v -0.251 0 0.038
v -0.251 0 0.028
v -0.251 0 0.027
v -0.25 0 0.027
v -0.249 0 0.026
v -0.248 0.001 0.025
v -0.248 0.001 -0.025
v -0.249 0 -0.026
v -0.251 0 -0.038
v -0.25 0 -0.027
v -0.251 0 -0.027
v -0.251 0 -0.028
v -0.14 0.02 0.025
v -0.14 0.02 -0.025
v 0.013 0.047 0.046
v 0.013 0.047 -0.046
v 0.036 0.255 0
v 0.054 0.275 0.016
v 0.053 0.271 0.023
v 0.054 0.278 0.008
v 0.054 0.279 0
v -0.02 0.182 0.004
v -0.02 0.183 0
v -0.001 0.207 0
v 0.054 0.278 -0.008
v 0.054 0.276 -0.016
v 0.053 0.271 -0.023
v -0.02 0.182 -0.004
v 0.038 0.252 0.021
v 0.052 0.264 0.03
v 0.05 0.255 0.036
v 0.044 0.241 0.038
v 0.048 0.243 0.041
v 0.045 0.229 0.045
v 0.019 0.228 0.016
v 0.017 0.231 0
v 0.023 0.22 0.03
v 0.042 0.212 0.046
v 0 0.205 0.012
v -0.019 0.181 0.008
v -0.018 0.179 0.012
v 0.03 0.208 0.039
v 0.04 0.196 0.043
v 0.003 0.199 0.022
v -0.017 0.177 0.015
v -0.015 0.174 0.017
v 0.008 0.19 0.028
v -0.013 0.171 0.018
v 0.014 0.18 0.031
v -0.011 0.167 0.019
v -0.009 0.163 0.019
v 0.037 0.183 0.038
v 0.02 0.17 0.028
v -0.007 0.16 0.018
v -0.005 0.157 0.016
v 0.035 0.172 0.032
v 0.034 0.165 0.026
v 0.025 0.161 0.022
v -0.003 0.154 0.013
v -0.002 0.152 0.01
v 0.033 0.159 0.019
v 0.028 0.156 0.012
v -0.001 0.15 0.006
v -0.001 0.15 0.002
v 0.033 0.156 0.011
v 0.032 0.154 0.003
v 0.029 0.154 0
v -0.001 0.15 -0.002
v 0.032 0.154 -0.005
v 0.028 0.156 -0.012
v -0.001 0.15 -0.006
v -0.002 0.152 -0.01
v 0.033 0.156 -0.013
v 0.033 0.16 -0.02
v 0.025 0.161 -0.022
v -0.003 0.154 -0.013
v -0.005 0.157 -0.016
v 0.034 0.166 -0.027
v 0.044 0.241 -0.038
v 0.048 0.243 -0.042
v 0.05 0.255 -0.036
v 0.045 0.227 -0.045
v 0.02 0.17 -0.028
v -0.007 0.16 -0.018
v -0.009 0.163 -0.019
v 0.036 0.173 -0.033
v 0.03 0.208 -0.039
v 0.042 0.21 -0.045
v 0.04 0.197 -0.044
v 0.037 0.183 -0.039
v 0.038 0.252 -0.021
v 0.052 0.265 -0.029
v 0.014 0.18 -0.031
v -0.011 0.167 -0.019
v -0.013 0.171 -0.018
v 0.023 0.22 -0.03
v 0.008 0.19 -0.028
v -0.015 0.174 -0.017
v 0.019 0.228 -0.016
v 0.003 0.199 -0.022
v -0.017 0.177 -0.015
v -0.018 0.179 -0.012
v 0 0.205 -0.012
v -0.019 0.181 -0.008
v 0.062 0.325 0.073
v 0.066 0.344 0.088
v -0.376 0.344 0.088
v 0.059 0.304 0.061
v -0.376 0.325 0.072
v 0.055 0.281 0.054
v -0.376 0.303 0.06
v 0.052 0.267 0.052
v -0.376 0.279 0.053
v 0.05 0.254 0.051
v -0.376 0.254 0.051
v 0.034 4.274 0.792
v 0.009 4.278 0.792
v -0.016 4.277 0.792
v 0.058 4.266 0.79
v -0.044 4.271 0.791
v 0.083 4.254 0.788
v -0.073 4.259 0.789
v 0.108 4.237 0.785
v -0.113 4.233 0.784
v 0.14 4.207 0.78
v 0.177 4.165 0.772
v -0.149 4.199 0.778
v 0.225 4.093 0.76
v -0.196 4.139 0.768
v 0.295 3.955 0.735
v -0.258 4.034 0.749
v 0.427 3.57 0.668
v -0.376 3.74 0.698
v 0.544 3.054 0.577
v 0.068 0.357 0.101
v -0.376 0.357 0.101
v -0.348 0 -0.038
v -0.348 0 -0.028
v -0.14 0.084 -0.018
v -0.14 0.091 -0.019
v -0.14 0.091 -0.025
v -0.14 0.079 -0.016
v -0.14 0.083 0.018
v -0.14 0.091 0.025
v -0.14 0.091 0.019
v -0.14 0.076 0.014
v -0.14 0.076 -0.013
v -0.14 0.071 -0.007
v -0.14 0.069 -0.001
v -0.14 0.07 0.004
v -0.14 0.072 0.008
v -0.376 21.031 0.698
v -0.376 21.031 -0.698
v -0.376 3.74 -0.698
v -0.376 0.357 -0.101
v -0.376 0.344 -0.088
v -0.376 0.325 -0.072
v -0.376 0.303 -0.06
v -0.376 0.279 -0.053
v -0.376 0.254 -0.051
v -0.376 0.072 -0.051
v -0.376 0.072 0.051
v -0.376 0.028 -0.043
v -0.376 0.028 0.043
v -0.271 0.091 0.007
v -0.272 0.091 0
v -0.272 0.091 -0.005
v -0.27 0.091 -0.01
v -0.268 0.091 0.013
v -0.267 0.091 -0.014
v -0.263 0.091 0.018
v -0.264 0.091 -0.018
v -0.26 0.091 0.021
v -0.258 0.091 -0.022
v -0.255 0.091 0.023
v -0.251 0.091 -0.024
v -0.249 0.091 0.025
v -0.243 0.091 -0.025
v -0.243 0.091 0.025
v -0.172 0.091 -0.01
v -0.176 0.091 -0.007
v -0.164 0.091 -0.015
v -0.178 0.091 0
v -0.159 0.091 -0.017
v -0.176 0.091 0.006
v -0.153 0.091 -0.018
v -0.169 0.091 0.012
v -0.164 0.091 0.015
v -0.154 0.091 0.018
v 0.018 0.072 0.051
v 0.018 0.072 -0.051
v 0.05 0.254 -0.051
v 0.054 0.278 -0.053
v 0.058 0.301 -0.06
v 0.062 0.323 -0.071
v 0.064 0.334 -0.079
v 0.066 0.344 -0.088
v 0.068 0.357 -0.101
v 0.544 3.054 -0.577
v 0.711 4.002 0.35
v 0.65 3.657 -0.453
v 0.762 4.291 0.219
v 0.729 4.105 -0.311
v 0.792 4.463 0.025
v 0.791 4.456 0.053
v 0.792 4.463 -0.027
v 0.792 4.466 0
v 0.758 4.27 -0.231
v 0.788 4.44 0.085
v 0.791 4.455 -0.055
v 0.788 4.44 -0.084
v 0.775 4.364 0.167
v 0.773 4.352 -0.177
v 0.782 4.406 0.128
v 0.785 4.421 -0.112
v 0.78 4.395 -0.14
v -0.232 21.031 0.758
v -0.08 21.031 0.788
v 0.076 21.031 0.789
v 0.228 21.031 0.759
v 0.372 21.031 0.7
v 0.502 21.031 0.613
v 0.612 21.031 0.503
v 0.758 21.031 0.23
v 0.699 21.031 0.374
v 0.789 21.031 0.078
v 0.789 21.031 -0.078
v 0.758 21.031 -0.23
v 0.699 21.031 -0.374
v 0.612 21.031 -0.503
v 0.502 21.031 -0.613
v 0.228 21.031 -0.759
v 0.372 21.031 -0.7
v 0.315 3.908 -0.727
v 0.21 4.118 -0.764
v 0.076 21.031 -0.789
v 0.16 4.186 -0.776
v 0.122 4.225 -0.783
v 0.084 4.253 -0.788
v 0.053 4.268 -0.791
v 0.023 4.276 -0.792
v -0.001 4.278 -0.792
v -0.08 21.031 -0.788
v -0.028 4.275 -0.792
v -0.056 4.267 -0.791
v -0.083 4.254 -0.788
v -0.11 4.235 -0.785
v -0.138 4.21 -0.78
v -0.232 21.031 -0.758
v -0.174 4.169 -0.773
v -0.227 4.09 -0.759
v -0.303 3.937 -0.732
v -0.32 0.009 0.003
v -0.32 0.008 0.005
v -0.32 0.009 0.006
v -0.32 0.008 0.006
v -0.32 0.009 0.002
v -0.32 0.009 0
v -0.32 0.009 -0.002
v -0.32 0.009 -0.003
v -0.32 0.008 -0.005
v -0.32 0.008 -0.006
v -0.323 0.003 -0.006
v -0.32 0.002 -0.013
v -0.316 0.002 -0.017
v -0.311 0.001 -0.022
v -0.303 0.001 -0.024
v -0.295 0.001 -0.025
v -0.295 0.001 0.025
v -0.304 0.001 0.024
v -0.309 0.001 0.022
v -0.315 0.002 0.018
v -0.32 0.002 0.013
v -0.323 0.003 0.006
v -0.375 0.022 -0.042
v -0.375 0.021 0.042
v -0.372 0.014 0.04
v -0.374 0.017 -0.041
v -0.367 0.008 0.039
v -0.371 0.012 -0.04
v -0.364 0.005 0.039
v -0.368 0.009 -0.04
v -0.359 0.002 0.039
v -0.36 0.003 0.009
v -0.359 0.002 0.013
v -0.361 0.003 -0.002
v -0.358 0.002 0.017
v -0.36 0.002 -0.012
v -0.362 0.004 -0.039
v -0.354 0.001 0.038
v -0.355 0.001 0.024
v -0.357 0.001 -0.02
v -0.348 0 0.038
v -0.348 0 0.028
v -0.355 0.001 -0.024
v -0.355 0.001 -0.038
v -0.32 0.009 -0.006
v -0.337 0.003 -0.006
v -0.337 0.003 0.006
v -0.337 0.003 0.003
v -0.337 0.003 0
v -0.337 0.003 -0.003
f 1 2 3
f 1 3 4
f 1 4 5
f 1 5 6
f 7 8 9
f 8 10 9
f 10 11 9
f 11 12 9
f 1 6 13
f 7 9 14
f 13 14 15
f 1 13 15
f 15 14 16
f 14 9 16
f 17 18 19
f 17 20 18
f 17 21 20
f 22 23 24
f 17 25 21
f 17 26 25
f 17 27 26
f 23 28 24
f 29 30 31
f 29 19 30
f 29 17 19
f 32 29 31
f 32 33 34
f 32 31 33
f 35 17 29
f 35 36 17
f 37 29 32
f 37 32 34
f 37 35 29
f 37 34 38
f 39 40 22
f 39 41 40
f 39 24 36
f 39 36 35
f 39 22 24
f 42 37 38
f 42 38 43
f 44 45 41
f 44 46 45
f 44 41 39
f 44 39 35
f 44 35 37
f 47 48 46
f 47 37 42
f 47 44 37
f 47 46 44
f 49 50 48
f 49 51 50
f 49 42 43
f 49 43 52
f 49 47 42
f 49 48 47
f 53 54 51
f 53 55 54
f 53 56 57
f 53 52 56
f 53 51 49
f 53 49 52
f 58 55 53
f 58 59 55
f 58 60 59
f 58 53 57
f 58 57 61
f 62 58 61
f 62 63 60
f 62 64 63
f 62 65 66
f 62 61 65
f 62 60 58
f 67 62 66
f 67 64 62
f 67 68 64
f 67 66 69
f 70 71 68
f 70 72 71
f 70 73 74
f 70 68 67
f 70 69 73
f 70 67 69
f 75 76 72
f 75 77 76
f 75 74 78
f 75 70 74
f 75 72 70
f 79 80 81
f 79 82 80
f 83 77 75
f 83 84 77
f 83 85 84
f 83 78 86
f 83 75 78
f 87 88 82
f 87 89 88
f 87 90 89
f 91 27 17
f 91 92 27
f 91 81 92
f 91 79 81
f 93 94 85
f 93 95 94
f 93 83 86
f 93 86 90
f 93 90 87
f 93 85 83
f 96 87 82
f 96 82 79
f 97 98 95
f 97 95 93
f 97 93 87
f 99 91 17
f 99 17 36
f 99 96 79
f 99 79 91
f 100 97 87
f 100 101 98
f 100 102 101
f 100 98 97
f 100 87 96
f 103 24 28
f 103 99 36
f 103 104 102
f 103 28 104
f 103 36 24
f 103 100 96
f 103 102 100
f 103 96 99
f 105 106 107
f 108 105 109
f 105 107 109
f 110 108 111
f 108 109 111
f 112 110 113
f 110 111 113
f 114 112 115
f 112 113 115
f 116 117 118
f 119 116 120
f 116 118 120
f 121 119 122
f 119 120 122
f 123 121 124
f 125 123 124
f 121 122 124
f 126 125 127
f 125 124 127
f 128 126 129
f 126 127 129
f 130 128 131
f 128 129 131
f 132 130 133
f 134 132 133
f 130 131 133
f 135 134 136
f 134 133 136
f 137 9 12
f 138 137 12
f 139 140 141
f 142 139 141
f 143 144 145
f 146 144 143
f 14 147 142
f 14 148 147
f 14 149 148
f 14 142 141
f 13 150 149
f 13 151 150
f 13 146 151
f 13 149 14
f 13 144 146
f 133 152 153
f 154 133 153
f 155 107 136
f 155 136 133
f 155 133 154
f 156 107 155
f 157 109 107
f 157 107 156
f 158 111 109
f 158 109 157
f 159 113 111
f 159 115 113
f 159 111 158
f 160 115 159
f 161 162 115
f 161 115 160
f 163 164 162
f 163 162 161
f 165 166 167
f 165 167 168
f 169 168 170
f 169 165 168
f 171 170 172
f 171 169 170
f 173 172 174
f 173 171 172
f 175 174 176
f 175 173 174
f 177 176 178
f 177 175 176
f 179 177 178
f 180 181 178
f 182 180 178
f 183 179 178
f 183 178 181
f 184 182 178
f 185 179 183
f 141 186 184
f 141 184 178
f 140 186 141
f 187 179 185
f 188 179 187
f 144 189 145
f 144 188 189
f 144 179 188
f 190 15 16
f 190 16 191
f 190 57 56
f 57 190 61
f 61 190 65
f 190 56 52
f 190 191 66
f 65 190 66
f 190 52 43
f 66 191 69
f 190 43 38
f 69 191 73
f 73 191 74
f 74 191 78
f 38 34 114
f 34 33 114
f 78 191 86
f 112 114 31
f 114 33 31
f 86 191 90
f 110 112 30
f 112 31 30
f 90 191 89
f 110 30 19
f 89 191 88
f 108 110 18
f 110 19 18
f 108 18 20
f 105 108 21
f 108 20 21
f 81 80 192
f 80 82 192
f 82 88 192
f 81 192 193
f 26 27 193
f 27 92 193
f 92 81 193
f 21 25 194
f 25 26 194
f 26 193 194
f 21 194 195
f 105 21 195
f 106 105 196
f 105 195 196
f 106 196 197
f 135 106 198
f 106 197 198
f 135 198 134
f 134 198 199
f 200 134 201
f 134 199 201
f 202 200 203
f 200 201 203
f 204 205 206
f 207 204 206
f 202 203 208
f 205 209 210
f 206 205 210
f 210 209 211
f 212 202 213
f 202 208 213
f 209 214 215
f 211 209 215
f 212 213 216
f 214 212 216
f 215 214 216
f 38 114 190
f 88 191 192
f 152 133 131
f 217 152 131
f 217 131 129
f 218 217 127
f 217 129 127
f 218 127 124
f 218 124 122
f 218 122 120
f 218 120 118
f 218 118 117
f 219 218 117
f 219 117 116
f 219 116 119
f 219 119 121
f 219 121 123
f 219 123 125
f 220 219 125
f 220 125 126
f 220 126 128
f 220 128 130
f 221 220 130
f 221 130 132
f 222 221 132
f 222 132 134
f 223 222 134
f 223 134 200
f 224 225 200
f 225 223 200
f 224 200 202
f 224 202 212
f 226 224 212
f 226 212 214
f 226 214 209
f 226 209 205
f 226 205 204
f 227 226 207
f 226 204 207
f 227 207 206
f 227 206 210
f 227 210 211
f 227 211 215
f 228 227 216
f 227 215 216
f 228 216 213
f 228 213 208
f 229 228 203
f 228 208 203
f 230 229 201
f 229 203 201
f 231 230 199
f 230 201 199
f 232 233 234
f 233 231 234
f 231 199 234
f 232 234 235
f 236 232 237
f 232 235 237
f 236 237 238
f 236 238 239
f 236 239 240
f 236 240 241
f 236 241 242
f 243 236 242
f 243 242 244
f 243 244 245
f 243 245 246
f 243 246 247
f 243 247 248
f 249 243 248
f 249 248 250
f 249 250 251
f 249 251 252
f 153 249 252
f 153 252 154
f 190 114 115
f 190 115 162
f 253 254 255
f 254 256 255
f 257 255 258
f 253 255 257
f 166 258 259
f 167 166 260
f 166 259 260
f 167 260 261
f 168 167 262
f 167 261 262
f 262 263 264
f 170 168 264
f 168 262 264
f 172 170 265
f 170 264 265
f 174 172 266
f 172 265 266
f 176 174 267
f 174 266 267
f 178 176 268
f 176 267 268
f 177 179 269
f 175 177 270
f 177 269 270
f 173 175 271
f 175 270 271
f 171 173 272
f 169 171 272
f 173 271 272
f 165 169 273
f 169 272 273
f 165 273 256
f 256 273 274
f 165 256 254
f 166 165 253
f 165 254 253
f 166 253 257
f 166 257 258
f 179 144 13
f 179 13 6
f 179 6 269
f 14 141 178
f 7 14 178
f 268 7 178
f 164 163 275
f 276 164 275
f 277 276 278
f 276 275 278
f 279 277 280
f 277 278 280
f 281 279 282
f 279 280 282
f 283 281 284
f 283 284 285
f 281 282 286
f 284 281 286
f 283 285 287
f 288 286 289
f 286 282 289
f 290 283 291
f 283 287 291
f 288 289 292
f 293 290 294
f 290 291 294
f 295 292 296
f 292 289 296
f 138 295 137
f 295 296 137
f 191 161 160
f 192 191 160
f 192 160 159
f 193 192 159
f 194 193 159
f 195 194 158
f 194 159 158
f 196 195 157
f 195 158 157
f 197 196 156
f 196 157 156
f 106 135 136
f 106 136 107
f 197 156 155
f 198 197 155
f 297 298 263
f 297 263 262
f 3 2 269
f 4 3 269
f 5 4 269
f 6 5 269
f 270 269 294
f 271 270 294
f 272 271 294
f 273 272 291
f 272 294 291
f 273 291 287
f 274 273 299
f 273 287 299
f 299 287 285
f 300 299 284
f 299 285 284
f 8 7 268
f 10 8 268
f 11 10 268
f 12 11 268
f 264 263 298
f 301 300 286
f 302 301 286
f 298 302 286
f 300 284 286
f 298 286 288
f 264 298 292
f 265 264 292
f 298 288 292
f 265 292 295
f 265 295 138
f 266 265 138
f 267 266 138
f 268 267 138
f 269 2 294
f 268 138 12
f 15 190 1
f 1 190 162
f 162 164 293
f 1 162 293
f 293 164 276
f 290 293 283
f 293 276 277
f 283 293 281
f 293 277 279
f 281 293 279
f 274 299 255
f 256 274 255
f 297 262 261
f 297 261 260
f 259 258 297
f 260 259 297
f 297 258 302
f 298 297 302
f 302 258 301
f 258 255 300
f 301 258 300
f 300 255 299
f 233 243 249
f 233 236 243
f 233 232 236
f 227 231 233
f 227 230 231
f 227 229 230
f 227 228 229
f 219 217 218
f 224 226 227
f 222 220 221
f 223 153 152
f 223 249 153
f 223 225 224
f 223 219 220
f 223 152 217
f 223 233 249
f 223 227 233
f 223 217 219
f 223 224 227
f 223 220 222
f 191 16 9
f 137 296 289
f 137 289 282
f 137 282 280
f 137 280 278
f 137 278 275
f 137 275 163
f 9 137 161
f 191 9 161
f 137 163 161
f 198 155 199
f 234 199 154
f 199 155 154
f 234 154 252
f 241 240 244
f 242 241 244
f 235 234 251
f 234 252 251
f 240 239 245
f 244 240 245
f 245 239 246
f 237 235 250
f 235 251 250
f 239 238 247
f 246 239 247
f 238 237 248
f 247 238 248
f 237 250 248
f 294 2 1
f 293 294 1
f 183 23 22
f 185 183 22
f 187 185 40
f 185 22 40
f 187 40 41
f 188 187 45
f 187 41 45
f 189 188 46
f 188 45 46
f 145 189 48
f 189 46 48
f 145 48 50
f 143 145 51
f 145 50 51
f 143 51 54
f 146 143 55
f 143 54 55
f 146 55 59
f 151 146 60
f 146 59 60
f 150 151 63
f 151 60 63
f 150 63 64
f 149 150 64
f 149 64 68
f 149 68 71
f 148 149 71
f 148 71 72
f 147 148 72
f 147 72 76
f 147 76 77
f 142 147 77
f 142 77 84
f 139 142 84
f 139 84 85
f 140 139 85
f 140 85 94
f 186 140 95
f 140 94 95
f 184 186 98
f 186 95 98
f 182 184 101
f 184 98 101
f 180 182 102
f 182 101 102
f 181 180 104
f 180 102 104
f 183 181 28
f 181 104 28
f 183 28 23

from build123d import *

# Parameters (mm, degrees)
TD_SKETCH_R                             = 0.79248
TL_FEATURE_DEPTH                        = 21.0312
TDF_STD_SKETCH_W                        = 2.09296
TDF_STD_SKETCH_H                        = 2.09296
TDF_STD_FEATURE_DEPTH                   = 22.061040395
ISA_20_STD_FEATURE_DEPTH                = 22.061040395
ISA_20_STD_FEATURE_DEPTH_BACK           = 22.061040395
VW_STD_FEATURE_DEPTH                    = 22.061040395
VW_STD_FEATURE_DEPTH_BACK               = 22.061040395
F_10BA_STD_FEATURE_DEPTH                = 22.061040503
F_10BA_STD_FEATURE_DEPTH_BACK           = 22.061040503
FRO_STD_FEATURE_DEPTH                   = 22.061040395
FRO_STD_FEATURE_DEPTH_BACK              = 22.061040395
C_STD_FEATURE_DEPTH                     = 22.061040395
C_STD_FEATURE_DEPTH_BACK                = 22.061040395
ERW_STD_FEATURE_DEPTH                   = 0.0254
H_STD_FEATURE_REACH                     = 22.896
H_STD_SKETCH_R                          = 0.01905
H_STD_SKETCH_3_R                        = 0.01905
FUNNEL_FINAL_DIAMETRE_STD_FEATURE_DEPTH = 2.499995
FUNNEL_FINAL_DIAMETRE_STD_FEATURE_DRAFT = -22.5
ROUND_BR_STD_FEATURE_START              = -1
ROUND_BR_STD_FEATURE_DEPTH              = 1.009339363
CBRA_STD_FEATURE_DEPTH                  = 0.00635


with BuildPart() as part:
    # TD_sketch → TL_feature (new body)
    with BuildSketch(Plane(origin=(0, 0, 0), x_dir=(1, 0, 0), z_dir=(0, 1, 0))):
        with Locations(Location((0, 0, 0), (0, 0, 270))):
            Circle(TD_SKETCH_R)
    extrude(amount=TL_FEATURE_DEPTH)

    # TDF_STD_sketch → TDF_STD_feature (cut, through all)
    with BuildSketch(Plane(origin=(0, 0, 0), x_dir=(1, 0, 0), z_dir=(0, 1, 0))):
        with Locations((-1.4224, 0)):
            Rectangle(TDF_STD_SKETCH_W, TDF_STD_SKETCH_H)
    extrude(amount=TDF_STD_FEATURE_DEPTH, mode=Mode.SUBTRACT)

    # ISA_20_STD_sketch → ISA_20_STD_feature (cut, two sides: drawn at the far end of the back side and taken through both)
    with BuildSketch(Plane(origin=(0, 0, 0), x_dir=(0, 0, -1), z_dir=(1, 0, 0)).offset(-ISA_20_STD_FEATURE_DEPTH_BACK)):
        Polygon((-12.955177728, 73.256388083), (-3.746467997, 21.0312), (-0.0381, 0), (0.0381, 0), (3.746467997, 21.0312), (12.955177728, 73.256388083), (12.955177728, -32.805303497), (-12.955177728, -32.805303497), align=None)
    extrude(amount=ISA_20_STD_FEATURE_DEPTH + ISA_20_STD_FEATURE_DEPTH_BACK, mode=Mode.SUBTRACT)

    # VW_STD_sketch → VW_STD_feature (cut, two sides: drawn at the far end of the back side and taken through both)
    with BuildSketch(Plane(origin=(0, 0, 0), x_dir=(0, 0, -1), z_dir=(1, 0, 0)).offset(-VW_STD_FEATURE_DEPTH_BACK)):
        with BuildLine():
            Line((-70.448918022, 70.704723144), (-20.775394878, 21.0312))
            Line((-20.775394878, 21.0312), (-0.087997439, 0.343802561))
            ThreePointArc((-0.087997439, 0.343802561), (-0.060467299, 0.302600796), (-0.0508, 0.254))
            Line((-0.0508, 0.254), (-0.0508, 0))
            Line((-0.0508, 0), (0.0508, 0))
            Line((0.0508, 0), (0.0508, 0.254))
            ThreePointArc((0.0508, 0.254), (0.060467299, 0.302600796), (0.087997439, 0.343802561))
            Line((0.087997439, 0.343802561), (20.775394878, 21.0312))
            Line((20.775394878, 21.0312), (70.448918022, 70.704723144))
            Line((70.448918022, 70.704723144), (70.448918022, -69.793217099))
            Line((70.448918022, -69.793217099), (-70.448918022, -69.793217099))
            Line((-70.448918022, -69.793217099), (-70.448918022, 70.704723144))
        make_face()
    extrude(amount=VW_STD_FEATURE_DEPTH + VW_STD_FEATURE_DEPTH_BACK, mode=Mode.SUBTRACT)

    # 10BA_STD_sketch → 10BA_STD_feature (cut, two sides: drawn at the far end of the back side and taken through both)
    with BuildSketch(Plane.XY.offset(-F_10BA_STD_FEATURE_DEPTH_BACK)):
        Polygon((-53.226091952, 0), (-0.37592, 0), (-0.25146, 0), (0.013312083, 0.046686462), (3.713447997, 21.0312), (12.890784046, 73.078459086), (91.272293968, 2.163710242), (25.155417971, -70.914748844), align=None)
    extrude(amount=F_10BA_STD_FEATURE_DEPTH + F_10BA_STD_FEATURE_DEPTH_BACK, mode=Mode.SUBTRACT)

    # FRO_STD_sketch → FRO_STD_feature (cut, two sides: drawn at the far end of the back side and taken through both)
    with BuildSketch(Plane.XY.offset(-FRO_STD_FEATURE_DEPTH_BACK)):
        with BuildLine():
            Line((-0.37592, 52.152138388), (-0.37592, 0.02794))
            ThreePointArc((-0.37592, 0.02794), (-0.367736563, 0.008183437), (-0.34798, 0))
            Line((-0.34798, 0), (51.776218388, 0))
            Line((51.776218388, 0), (-21.9385299, -73.714748288))
            Line((-21.9385299, -73.714748288), (-74.090668288, -21.5626099))
            Line((-74.090668288, -21.5626099), (-0.37592, 52.152138388))
        make_face()
    extrude(amount=FRO_STD_FEATURE_DEPTH + FRO_STD_FEATURE_DEPTH_BACK, mode=Mode.SUBTRACT)

    # C_STD_sketch → C_STD_feature (cut, two sides: drawn at the far end of the back side and taken through both)
    with BuildSketch(Plane(origin=(0, 0, 0), x_dir=(0, 0, -1), z_dir=(1, 0, 0)).offset(-C_STD_FEATURE_DEPTH_BACK)):
        with BuildLine():
            Line((-50.8957695, -11.2378876), (-0.027944581, 0))
            ThreePointArc((-0.027944581, 0), (0, 0.003050032), (0.027944581, 0))
            Line((0.027944581, 0), (50.8957695, -11.2378876))
            Line((50.8957695, -11.2378876), (50.8957695, -115.426672595))
            Line((50.8957695, -115.426672595), (-50.8957695, -115.426672595))
            Line((-50.8957695, -115.426672595), (-50.8957695, -11.2378876))
        make_face()
    extrude(amount=C_STD_FEATURE_DEPTH + C_STD_FEATURE_DEPTH_BACK, mode=Mode.SUBTRACT)


with BuildPart() as body_2:
    # ERW_STD_sketch → ERW_STD_feature (new, symmetric)
    with BuildSketch(Plane.XY):
        Polygon((-0.1397, 0.09144), (-0.1397, 0), (-0.32512, 0), (-0.272327091, 0.09144), align=None)
    extrude(amount=ERW_STD_FEATURE_DEPTH, both=True)

    # H_STD_sketch → H_STD_feature (add, up to next)
    with BuildSketch(Plane(origin=(-0.010357492, 0.166115932, 0), x_dir=(0, 0, -1), z_dir=(0.8660254037844415, 0.4999999999999953, 0)), mode=Mode.PRIVATE) as h_std_feature_sk1:
        with Locations(Location((0, 0, 0), (0, 0, 90))):
            Circle(H_STD_SKETCH_R)
    h_std_feature_tool1 = extrude(h_std_feature_sk1.sketch, amount=-H_STD_FEATURE_REACH, mode=Mode.PRIVATE) - body_2.part
    add(h_std_feature_tool1.solids().sort_by_distance((-0.010357, 0.166116, 0))[0])


with BuildPart() as funnel_final_diametre_std_feature_tool:
    # H_STD_sketch<3> → funnel_final_diametre_STD_feature (with draft: the straight prism first)
    with BuildSketch(Plane(origin=(-0.010357492, 0.166115932, 0), x_dir=(0, 0, -1), z_dir=(0.8660254037844415, 0.4999999999999953, 0))):
        with Locations(Location((0, 0, 0), (0, 0, 90))):
            Circle(H_STD_SKETCH_3_R)
    extrude(amount=FUNNEL_FINAL_DIAMETRE_STD_FEATURE_DEPTH)
    # funnel_final_diametre_STD_feature: the draft: its side faces are tilted about the plane it starts from
    funnel_final_diametre_std_feature_sides = [funnel_final_diametre_std_feature_tool.faces().sort_by_distance(p)[0] for p in [
        (1.081697098, 0.774616898, 0),
    ]]
    draft(funnel_final_diametre_std_feature_sides, Plane(origin=(-0.010357492, 0.166115932, 0), x_dir=(0, 0, -1), z_dir=(0.8660254037844415, 0.4999999999999953, 0)), FUNNEL_FINAL_DIAMETRE_STD_FEATURE_DRAFT)


with BuildPart() as body_2_1:
    add(body_2.part)

    # funnel_final_diametre_STD_feature: add funnel_final_diametre_std_feature_tool
    add(funnel_final_diametre_std_feature_tool.part)

    # ROUND_BR_STD_feature: read off the stored shape, not the designer's step
    # ROUND_BR_STD_feature outline → ROUND_BR_STD_feature (cut)
    with BuildSketch(Plane(origin=(0, 0, 0), x_dir=(0.8660254037844362, -0.5000000000000042, 0), z_dir=(0.5000000000000042, 0.8660254037844363, 0)).offset(ROUND_BR_STD_FEATURE_START)):
        with BuildLine():
            Line((-0.281562179, -0.0254), (-0.256162179, -0.0254))
            ThreePointArc((-0.256162179, -0.0254), (-0.274122691, -0.017960512), (-0.281562179, 0))
            Line((-0.281562179, 0), (-0.281562179, -0.0254))
        make_face()
        with BuildLine():
            Line((-0.281562179, 0.0254), (-0.281562179, 0))
            ThreePointArc((-0.281562179, 0), (-0.274122691, 0.017960512), (-0.256162179, 0.0254))
            Line((-0.256162179, 0.0254), (-0.281562179, 0.0254))
        make_face()
    extrude(amount=ROUND_BR_STD_FEATURE_DEPTH, mode=Mode.SUBTRACT)


with BuildPart() as part_1:
    add(part.part)

    # COMBINE_STD_feature: cut body 2
    add(body_2_1.part, mode=Mode.SUBTRACT)

    # CBRA_STD_sketch → CBRA_STD_feature (cut, symmetric)
    with BuildSketch(Plane.XY):
        Polygon((-0.319782487, 0.009244844), (-0.345182487, 0), (-0.319782487, 0), align=None)
    extrude(amount=CBRA_STD_FEATURE_DEPTH, both=True, mode=Mode.SUBTRACT)


solid = part_1.part
